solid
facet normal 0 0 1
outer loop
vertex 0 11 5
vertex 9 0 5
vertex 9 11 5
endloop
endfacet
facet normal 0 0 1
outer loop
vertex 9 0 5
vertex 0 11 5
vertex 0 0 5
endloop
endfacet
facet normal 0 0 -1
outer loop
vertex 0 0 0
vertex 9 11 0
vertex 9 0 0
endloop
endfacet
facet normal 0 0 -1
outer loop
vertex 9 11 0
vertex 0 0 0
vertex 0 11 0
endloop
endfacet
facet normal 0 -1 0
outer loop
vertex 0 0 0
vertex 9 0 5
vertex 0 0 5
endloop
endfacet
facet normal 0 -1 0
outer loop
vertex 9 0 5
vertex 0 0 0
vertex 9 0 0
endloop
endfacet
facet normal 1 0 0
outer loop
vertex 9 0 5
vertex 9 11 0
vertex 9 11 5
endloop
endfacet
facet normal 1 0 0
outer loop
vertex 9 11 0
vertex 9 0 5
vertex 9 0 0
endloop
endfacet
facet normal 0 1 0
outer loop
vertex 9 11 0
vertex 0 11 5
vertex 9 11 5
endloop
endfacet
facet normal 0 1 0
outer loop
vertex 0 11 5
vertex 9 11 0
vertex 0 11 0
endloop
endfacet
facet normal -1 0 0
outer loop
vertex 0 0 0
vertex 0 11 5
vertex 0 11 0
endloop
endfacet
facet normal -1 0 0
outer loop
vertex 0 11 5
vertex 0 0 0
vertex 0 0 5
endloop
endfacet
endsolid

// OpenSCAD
// Generated by SolidPython 1.0.1 on 2020-07-29 00:46:55


cube(size = [9, 11, 5]);
/***********************************************
*********      SolidPython code:      **********
************************************************
 
# import packages: SolidPython
from solid import *
from solid.utils import *
from itertools import chain, combinations, permutations


class Resize:

    def __init__(self, scad_file):
        self.scad_file = scad_file
        #self.scad_file = import_scad(scad_file)
        # cone/cylinder param:
        self.r1 = 0
        self.r2 = 0
        self.h = 0
        # rectangular prism param:
        self.w = 0
        self.l = 0
        # ellipse param:
        self.r = 0

    # import OpenScad code (file name corresponds to shape)


    # classify shape + parameters
    def assign(self, param1, param2, param3):
        if self.scad_file == 'cone.scad':
            self.r1 = param1
            self.r2 = param2
            self.h = param3
        elif self.scad_file == 'cylinder.scad':
            self.r1 = param1
            self.r2 = param2
            self.h = param3
        elif self.scad_file == 'rectangularPrism.scad':
            self.h = param1
            self.l = param2
            self.w = param3
        else:
            self.r = param1
            self.h = param2

    # resize parameters
    def iterate(self):
        x = range(3, 20, 2)
        i = 1
        if self.scad_file == 'cone.scad':
            tempList = list(permutations(x, 2))
            for temp in tempList:
                param1 = temp[0]
                param2 = temp[1]
                filepath = 'produced_scad_files/' + 'cone' + str(param1) + '_' + str(param2) + '_' + '.scad'
                scad_render_to_file(cylinder(h=param1, r1=param2, r2=0), filepath)

        elif self.scad_file == 'cylinder.scad':
            tempList = list(permutations(x, 3))
            for temp in tempList:
                param1 = temp[0]
                param2 = temp[1]
                filepath = 'produced_scad_files/' + 'cylinder' + str(param1) + '_' + str(param2) + '_' + '.scad'
                scad_render_to_file(cylinder(h=param1, r1=param2, r2=param2), filepath)

        elif self.scad_file == 'rectangularPrism.scad':
            tempList = list(permutations(x, 3))
            for temp in tempList:
                param1 = temp[0]
                param2 = temp[1]
                param3 = temp[2]
                filepath = 'produced_scad_files/' + 'rectangularPrism' + str(param1) + '_' + str(param2) + '_' + str(
                    param3) + '.scad'
                scad_render_to_file(cube(size=(param1, param2, param3)), filepath)

        elif self.scad_file == 'ellipse.scad':
            tempList = list(permutations(x, 4))
            for temp in tempList:
                param1 = temp[0]
                param2 = temp[1]
                param3 = temp[2]
                param4 = temp[3]
                filepath = 'produced_scad_files/' + 'ellipse' + str(param1) + '_' + str(param2) + '_' + str(param3) + '_' + str(param4) + '.scad'
                scad_render_to_file(scale([param1, param2, param3])(sphere(r=param4)), filepath)

    def render_to_scadfile(self):
        scad_render_to_file(scad, 'example.scad') 
 
************************************************/
